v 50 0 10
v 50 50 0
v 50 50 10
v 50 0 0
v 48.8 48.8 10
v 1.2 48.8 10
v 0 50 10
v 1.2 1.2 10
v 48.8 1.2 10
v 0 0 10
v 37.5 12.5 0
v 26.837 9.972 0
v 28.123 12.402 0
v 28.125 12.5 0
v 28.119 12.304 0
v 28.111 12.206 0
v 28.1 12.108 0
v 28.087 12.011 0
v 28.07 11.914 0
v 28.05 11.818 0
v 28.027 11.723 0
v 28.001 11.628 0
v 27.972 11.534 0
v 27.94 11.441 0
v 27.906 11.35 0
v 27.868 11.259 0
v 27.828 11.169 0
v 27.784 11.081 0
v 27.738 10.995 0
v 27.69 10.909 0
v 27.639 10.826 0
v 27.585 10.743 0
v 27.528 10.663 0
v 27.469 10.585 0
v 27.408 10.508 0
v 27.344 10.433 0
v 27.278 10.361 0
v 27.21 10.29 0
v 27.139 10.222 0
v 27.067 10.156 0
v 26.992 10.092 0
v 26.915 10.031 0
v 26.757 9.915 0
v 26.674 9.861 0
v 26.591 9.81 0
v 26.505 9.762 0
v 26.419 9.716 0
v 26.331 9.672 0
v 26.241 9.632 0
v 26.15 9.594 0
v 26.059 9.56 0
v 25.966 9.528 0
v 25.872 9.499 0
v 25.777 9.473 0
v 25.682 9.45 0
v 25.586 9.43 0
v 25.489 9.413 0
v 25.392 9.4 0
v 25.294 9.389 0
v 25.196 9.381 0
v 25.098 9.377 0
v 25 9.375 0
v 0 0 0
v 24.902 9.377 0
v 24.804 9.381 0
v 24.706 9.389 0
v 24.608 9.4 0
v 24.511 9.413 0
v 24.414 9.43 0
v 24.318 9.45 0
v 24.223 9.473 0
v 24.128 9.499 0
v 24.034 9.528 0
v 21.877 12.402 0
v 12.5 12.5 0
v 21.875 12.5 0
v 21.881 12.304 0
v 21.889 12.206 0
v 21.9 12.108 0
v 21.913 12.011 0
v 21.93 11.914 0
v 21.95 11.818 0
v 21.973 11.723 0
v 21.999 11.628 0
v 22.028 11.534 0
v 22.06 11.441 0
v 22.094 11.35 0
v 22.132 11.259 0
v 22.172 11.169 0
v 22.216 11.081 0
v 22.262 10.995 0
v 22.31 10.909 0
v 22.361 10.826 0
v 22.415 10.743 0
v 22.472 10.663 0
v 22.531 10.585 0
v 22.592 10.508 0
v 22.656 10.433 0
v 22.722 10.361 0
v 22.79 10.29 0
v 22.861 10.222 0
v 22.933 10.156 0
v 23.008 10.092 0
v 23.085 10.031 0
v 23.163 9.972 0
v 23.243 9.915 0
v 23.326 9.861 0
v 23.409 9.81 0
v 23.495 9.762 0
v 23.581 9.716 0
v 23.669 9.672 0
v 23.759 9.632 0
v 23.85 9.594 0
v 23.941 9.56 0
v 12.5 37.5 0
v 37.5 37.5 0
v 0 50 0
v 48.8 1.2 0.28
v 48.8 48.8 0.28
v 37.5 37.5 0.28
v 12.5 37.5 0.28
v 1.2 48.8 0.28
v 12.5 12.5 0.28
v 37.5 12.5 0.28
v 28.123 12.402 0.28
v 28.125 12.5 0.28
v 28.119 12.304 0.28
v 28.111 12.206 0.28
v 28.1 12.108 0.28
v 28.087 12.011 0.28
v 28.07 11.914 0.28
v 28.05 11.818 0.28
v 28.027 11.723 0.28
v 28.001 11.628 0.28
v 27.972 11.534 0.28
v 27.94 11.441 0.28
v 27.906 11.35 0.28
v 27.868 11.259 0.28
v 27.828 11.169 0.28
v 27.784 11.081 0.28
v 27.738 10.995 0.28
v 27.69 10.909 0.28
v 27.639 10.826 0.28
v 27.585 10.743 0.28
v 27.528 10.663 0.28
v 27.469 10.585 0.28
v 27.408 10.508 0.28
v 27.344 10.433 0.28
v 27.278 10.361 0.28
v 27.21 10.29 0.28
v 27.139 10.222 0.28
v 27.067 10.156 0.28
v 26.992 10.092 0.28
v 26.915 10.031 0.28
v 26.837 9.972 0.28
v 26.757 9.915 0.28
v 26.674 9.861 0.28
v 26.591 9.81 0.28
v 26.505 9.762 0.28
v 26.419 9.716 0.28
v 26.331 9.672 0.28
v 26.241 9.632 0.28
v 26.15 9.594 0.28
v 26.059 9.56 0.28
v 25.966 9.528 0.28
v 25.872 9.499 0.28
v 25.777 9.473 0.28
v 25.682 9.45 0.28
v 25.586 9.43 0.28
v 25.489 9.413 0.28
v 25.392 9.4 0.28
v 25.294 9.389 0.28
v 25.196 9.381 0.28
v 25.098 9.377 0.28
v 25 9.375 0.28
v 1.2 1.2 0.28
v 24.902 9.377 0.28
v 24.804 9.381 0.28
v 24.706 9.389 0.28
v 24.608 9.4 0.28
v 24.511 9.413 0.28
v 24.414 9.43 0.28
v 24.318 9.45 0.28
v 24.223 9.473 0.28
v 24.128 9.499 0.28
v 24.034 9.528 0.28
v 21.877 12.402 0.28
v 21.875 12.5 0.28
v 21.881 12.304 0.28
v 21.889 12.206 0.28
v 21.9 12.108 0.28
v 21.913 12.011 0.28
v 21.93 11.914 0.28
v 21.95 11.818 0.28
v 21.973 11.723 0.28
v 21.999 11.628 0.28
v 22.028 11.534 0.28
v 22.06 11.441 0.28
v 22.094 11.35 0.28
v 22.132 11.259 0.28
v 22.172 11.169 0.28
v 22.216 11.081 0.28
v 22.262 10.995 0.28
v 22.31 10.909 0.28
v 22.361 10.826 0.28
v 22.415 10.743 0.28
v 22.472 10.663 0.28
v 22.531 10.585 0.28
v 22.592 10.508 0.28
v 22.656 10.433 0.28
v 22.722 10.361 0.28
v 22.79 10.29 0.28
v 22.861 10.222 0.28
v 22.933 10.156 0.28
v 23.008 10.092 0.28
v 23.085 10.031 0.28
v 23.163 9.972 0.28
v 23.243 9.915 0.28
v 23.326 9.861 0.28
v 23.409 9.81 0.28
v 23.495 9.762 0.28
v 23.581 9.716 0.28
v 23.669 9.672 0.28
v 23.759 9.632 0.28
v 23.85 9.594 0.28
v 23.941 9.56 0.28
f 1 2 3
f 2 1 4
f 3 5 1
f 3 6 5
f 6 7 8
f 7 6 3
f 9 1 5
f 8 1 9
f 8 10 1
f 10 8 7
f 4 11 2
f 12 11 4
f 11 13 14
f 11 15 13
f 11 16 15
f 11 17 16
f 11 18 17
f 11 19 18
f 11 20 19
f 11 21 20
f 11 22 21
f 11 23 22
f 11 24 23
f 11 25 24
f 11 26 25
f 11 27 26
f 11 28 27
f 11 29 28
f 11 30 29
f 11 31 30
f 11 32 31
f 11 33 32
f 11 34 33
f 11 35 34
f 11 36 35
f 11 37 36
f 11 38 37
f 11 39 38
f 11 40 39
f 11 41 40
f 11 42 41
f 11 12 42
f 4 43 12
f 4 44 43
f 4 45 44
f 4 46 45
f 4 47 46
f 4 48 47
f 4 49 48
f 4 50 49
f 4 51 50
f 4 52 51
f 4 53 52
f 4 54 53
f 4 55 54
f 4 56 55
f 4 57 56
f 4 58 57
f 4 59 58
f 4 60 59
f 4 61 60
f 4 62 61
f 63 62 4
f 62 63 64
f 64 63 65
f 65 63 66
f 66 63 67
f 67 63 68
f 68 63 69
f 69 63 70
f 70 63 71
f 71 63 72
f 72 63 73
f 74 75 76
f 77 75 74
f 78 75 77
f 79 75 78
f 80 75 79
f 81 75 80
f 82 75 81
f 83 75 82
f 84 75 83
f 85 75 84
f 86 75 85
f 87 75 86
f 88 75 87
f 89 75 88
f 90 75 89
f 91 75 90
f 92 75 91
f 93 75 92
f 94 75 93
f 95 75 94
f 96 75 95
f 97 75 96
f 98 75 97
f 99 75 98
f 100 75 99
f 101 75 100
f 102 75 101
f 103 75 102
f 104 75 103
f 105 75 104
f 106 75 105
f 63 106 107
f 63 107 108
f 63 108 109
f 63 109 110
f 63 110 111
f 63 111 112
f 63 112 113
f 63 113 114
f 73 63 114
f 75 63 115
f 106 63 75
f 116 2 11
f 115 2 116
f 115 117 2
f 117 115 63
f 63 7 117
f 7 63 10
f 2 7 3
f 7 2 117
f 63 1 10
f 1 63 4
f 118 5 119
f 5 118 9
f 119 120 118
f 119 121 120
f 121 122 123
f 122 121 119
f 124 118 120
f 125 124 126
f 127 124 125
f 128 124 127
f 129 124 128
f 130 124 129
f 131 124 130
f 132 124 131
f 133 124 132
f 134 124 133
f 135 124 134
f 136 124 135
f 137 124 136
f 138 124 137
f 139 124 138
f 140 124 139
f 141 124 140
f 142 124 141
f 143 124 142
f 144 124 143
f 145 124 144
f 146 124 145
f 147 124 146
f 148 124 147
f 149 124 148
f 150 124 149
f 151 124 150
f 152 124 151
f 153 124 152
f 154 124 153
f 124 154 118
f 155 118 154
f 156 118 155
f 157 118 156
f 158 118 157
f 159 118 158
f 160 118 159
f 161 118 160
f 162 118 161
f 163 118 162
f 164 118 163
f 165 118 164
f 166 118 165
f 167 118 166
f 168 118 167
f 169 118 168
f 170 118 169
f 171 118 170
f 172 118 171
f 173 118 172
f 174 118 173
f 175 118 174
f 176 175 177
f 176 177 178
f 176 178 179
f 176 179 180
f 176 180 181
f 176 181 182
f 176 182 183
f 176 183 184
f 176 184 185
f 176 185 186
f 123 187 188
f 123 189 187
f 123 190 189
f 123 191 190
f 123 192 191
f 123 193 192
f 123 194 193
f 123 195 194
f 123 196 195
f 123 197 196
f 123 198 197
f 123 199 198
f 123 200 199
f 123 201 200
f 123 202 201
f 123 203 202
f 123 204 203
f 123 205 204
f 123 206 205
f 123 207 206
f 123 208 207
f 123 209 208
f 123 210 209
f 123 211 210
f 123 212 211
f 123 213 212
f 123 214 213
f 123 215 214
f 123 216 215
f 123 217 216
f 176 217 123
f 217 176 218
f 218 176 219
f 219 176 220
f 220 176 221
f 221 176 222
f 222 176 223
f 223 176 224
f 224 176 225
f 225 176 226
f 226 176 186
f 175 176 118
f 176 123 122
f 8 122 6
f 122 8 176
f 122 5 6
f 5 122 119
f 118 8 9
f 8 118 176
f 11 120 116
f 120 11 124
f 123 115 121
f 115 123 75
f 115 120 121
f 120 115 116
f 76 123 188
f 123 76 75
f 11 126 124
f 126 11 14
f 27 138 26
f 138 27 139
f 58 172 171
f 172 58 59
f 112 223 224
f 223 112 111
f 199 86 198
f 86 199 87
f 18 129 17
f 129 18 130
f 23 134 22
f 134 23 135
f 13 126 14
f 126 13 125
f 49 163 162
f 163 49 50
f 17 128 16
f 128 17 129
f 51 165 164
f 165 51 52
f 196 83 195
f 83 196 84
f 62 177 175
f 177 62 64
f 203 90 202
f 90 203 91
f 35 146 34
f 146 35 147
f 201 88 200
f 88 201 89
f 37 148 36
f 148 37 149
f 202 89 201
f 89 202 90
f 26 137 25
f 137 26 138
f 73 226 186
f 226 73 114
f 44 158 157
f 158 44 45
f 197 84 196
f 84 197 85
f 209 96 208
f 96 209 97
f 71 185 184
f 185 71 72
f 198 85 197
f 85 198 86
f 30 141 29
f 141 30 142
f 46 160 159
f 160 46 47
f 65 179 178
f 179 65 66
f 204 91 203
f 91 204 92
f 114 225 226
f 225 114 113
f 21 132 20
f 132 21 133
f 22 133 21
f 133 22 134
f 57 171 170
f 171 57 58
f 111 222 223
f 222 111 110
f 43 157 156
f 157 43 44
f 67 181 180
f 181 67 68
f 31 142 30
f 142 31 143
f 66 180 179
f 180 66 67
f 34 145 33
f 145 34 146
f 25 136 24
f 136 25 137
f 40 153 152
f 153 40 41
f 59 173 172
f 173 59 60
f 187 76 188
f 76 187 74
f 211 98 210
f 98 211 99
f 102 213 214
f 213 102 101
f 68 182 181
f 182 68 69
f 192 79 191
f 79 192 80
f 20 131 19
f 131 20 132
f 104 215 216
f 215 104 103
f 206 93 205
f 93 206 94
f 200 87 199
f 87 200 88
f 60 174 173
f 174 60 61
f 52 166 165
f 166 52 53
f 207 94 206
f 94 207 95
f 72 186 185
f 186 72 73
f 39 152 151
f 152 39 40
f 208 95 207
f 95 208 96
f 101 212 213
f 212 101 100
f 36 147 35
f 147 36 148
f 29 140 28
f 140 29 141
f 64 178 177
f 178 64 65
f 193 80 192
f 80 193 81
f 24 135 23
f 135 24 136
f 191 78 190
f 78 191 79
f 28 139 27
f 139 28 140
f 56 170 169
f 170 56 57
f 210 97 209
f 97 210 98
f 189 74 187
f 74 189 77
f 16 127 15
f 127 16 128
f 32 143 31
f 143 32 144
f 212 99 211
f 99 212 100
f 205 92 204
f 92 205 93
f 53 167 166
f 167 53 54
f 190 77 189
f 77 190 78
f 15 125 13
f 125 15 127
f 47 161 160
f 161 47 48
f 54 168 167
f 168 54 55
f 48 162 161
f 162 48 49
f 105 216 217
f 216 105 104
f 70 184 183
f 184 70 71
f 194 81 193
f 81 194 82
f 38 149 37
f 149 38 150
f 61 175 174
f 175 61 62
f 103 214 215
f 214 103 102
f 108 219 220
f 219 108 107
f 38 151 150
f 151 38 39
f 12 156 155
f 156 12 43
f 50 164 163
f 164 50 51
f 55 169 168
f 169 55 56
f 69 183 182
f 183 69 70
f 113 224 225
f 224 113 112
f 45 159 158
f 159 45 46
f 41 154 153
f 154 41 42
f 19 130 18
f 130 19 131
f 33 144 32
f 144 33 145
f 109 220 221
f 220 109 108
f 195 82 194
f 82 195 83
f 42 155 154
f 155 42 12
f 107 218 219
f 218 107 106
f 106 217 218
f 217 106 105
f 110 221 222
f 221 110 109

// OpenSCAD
$fn=200;
/*
s=40;
t=.2;
b=20; // border distance
nl=20;
nb=5;

l=.6;
wd=3;    //wall distance
/**/


flow();

module flow(){
    s=50;
    h=10;
    t=1.2;
    lh=0.28;
    difference(){
        union(){
            cube([s,s,h]);
        }
        
        translate([t,t,lh])
        cube([s-t*2,s-t*2,h]);
        
        // center hole
        translate([s/4,s/4,-.1])
        cube([s/2,s/2,h]);

        // front mark
        translate([s/2,s/4,-.1])
        cylinder(d=s/8, h=h);
    }
}    

module calib(){
    overhang=1;
    a=30;
    y=s/2;
    difference(){
        union(){
            translate([-s/2,-y/2,0])
            cube([s,y,t*nb]);
            
            hull(){
                translate([-s/2,-y/2, t*nb])
                cube([s,y,.1]);
                
                translate([-s/2,-y/2, nl*t-t*nb])
                if(overhang==1){
                    cube([s,y+nl*t-.7, t*nb]);
                }else{
                    cube([s,y, t*nb]);
                }
            }
        }
        
        // 1mm
        translate([-s/3,-y/2*1.1, -1])
        rotate([45,0,90])
        oblong(3.5,1, nl*t*4);
        // 2mm
        translate([0,-y/2*1.1, -2])
        rotate([55,0,90])
        oblong(3.5,2, nl*t*4);
        
        // bridge test
        translate([-y/2, -y/4, -.1])
        oblong(y,y/2, (nl*t)/3);  
  
        // holes
        d1=3;
        d2=5;
        translate([-s/2+wd+d2/2,y/2-wd-d2/2,-1])
        polyhole(d=d1, h=y);
        translate([s/2-wd-d2/2,y/2-wd-d2/2,-1])
        polyhole(d=d2, h=y);
    }
}    

module polyhole(h, d) {
    n = max(round(2 * d),3);
    rotate([0,0,180])
        cylinder(h = h, r = (d / 2) / cos (180 / n), $fn = n);
}
module oblong(len,width,height){
    translate([width/2,0,0])
    union(){
        hull(){
            translate([0,width/2,0]) cylinder(h=height, d=width);
            translate([len-width,width/2,0]) cylinder(h=height, d=width);
        }
    }
}
